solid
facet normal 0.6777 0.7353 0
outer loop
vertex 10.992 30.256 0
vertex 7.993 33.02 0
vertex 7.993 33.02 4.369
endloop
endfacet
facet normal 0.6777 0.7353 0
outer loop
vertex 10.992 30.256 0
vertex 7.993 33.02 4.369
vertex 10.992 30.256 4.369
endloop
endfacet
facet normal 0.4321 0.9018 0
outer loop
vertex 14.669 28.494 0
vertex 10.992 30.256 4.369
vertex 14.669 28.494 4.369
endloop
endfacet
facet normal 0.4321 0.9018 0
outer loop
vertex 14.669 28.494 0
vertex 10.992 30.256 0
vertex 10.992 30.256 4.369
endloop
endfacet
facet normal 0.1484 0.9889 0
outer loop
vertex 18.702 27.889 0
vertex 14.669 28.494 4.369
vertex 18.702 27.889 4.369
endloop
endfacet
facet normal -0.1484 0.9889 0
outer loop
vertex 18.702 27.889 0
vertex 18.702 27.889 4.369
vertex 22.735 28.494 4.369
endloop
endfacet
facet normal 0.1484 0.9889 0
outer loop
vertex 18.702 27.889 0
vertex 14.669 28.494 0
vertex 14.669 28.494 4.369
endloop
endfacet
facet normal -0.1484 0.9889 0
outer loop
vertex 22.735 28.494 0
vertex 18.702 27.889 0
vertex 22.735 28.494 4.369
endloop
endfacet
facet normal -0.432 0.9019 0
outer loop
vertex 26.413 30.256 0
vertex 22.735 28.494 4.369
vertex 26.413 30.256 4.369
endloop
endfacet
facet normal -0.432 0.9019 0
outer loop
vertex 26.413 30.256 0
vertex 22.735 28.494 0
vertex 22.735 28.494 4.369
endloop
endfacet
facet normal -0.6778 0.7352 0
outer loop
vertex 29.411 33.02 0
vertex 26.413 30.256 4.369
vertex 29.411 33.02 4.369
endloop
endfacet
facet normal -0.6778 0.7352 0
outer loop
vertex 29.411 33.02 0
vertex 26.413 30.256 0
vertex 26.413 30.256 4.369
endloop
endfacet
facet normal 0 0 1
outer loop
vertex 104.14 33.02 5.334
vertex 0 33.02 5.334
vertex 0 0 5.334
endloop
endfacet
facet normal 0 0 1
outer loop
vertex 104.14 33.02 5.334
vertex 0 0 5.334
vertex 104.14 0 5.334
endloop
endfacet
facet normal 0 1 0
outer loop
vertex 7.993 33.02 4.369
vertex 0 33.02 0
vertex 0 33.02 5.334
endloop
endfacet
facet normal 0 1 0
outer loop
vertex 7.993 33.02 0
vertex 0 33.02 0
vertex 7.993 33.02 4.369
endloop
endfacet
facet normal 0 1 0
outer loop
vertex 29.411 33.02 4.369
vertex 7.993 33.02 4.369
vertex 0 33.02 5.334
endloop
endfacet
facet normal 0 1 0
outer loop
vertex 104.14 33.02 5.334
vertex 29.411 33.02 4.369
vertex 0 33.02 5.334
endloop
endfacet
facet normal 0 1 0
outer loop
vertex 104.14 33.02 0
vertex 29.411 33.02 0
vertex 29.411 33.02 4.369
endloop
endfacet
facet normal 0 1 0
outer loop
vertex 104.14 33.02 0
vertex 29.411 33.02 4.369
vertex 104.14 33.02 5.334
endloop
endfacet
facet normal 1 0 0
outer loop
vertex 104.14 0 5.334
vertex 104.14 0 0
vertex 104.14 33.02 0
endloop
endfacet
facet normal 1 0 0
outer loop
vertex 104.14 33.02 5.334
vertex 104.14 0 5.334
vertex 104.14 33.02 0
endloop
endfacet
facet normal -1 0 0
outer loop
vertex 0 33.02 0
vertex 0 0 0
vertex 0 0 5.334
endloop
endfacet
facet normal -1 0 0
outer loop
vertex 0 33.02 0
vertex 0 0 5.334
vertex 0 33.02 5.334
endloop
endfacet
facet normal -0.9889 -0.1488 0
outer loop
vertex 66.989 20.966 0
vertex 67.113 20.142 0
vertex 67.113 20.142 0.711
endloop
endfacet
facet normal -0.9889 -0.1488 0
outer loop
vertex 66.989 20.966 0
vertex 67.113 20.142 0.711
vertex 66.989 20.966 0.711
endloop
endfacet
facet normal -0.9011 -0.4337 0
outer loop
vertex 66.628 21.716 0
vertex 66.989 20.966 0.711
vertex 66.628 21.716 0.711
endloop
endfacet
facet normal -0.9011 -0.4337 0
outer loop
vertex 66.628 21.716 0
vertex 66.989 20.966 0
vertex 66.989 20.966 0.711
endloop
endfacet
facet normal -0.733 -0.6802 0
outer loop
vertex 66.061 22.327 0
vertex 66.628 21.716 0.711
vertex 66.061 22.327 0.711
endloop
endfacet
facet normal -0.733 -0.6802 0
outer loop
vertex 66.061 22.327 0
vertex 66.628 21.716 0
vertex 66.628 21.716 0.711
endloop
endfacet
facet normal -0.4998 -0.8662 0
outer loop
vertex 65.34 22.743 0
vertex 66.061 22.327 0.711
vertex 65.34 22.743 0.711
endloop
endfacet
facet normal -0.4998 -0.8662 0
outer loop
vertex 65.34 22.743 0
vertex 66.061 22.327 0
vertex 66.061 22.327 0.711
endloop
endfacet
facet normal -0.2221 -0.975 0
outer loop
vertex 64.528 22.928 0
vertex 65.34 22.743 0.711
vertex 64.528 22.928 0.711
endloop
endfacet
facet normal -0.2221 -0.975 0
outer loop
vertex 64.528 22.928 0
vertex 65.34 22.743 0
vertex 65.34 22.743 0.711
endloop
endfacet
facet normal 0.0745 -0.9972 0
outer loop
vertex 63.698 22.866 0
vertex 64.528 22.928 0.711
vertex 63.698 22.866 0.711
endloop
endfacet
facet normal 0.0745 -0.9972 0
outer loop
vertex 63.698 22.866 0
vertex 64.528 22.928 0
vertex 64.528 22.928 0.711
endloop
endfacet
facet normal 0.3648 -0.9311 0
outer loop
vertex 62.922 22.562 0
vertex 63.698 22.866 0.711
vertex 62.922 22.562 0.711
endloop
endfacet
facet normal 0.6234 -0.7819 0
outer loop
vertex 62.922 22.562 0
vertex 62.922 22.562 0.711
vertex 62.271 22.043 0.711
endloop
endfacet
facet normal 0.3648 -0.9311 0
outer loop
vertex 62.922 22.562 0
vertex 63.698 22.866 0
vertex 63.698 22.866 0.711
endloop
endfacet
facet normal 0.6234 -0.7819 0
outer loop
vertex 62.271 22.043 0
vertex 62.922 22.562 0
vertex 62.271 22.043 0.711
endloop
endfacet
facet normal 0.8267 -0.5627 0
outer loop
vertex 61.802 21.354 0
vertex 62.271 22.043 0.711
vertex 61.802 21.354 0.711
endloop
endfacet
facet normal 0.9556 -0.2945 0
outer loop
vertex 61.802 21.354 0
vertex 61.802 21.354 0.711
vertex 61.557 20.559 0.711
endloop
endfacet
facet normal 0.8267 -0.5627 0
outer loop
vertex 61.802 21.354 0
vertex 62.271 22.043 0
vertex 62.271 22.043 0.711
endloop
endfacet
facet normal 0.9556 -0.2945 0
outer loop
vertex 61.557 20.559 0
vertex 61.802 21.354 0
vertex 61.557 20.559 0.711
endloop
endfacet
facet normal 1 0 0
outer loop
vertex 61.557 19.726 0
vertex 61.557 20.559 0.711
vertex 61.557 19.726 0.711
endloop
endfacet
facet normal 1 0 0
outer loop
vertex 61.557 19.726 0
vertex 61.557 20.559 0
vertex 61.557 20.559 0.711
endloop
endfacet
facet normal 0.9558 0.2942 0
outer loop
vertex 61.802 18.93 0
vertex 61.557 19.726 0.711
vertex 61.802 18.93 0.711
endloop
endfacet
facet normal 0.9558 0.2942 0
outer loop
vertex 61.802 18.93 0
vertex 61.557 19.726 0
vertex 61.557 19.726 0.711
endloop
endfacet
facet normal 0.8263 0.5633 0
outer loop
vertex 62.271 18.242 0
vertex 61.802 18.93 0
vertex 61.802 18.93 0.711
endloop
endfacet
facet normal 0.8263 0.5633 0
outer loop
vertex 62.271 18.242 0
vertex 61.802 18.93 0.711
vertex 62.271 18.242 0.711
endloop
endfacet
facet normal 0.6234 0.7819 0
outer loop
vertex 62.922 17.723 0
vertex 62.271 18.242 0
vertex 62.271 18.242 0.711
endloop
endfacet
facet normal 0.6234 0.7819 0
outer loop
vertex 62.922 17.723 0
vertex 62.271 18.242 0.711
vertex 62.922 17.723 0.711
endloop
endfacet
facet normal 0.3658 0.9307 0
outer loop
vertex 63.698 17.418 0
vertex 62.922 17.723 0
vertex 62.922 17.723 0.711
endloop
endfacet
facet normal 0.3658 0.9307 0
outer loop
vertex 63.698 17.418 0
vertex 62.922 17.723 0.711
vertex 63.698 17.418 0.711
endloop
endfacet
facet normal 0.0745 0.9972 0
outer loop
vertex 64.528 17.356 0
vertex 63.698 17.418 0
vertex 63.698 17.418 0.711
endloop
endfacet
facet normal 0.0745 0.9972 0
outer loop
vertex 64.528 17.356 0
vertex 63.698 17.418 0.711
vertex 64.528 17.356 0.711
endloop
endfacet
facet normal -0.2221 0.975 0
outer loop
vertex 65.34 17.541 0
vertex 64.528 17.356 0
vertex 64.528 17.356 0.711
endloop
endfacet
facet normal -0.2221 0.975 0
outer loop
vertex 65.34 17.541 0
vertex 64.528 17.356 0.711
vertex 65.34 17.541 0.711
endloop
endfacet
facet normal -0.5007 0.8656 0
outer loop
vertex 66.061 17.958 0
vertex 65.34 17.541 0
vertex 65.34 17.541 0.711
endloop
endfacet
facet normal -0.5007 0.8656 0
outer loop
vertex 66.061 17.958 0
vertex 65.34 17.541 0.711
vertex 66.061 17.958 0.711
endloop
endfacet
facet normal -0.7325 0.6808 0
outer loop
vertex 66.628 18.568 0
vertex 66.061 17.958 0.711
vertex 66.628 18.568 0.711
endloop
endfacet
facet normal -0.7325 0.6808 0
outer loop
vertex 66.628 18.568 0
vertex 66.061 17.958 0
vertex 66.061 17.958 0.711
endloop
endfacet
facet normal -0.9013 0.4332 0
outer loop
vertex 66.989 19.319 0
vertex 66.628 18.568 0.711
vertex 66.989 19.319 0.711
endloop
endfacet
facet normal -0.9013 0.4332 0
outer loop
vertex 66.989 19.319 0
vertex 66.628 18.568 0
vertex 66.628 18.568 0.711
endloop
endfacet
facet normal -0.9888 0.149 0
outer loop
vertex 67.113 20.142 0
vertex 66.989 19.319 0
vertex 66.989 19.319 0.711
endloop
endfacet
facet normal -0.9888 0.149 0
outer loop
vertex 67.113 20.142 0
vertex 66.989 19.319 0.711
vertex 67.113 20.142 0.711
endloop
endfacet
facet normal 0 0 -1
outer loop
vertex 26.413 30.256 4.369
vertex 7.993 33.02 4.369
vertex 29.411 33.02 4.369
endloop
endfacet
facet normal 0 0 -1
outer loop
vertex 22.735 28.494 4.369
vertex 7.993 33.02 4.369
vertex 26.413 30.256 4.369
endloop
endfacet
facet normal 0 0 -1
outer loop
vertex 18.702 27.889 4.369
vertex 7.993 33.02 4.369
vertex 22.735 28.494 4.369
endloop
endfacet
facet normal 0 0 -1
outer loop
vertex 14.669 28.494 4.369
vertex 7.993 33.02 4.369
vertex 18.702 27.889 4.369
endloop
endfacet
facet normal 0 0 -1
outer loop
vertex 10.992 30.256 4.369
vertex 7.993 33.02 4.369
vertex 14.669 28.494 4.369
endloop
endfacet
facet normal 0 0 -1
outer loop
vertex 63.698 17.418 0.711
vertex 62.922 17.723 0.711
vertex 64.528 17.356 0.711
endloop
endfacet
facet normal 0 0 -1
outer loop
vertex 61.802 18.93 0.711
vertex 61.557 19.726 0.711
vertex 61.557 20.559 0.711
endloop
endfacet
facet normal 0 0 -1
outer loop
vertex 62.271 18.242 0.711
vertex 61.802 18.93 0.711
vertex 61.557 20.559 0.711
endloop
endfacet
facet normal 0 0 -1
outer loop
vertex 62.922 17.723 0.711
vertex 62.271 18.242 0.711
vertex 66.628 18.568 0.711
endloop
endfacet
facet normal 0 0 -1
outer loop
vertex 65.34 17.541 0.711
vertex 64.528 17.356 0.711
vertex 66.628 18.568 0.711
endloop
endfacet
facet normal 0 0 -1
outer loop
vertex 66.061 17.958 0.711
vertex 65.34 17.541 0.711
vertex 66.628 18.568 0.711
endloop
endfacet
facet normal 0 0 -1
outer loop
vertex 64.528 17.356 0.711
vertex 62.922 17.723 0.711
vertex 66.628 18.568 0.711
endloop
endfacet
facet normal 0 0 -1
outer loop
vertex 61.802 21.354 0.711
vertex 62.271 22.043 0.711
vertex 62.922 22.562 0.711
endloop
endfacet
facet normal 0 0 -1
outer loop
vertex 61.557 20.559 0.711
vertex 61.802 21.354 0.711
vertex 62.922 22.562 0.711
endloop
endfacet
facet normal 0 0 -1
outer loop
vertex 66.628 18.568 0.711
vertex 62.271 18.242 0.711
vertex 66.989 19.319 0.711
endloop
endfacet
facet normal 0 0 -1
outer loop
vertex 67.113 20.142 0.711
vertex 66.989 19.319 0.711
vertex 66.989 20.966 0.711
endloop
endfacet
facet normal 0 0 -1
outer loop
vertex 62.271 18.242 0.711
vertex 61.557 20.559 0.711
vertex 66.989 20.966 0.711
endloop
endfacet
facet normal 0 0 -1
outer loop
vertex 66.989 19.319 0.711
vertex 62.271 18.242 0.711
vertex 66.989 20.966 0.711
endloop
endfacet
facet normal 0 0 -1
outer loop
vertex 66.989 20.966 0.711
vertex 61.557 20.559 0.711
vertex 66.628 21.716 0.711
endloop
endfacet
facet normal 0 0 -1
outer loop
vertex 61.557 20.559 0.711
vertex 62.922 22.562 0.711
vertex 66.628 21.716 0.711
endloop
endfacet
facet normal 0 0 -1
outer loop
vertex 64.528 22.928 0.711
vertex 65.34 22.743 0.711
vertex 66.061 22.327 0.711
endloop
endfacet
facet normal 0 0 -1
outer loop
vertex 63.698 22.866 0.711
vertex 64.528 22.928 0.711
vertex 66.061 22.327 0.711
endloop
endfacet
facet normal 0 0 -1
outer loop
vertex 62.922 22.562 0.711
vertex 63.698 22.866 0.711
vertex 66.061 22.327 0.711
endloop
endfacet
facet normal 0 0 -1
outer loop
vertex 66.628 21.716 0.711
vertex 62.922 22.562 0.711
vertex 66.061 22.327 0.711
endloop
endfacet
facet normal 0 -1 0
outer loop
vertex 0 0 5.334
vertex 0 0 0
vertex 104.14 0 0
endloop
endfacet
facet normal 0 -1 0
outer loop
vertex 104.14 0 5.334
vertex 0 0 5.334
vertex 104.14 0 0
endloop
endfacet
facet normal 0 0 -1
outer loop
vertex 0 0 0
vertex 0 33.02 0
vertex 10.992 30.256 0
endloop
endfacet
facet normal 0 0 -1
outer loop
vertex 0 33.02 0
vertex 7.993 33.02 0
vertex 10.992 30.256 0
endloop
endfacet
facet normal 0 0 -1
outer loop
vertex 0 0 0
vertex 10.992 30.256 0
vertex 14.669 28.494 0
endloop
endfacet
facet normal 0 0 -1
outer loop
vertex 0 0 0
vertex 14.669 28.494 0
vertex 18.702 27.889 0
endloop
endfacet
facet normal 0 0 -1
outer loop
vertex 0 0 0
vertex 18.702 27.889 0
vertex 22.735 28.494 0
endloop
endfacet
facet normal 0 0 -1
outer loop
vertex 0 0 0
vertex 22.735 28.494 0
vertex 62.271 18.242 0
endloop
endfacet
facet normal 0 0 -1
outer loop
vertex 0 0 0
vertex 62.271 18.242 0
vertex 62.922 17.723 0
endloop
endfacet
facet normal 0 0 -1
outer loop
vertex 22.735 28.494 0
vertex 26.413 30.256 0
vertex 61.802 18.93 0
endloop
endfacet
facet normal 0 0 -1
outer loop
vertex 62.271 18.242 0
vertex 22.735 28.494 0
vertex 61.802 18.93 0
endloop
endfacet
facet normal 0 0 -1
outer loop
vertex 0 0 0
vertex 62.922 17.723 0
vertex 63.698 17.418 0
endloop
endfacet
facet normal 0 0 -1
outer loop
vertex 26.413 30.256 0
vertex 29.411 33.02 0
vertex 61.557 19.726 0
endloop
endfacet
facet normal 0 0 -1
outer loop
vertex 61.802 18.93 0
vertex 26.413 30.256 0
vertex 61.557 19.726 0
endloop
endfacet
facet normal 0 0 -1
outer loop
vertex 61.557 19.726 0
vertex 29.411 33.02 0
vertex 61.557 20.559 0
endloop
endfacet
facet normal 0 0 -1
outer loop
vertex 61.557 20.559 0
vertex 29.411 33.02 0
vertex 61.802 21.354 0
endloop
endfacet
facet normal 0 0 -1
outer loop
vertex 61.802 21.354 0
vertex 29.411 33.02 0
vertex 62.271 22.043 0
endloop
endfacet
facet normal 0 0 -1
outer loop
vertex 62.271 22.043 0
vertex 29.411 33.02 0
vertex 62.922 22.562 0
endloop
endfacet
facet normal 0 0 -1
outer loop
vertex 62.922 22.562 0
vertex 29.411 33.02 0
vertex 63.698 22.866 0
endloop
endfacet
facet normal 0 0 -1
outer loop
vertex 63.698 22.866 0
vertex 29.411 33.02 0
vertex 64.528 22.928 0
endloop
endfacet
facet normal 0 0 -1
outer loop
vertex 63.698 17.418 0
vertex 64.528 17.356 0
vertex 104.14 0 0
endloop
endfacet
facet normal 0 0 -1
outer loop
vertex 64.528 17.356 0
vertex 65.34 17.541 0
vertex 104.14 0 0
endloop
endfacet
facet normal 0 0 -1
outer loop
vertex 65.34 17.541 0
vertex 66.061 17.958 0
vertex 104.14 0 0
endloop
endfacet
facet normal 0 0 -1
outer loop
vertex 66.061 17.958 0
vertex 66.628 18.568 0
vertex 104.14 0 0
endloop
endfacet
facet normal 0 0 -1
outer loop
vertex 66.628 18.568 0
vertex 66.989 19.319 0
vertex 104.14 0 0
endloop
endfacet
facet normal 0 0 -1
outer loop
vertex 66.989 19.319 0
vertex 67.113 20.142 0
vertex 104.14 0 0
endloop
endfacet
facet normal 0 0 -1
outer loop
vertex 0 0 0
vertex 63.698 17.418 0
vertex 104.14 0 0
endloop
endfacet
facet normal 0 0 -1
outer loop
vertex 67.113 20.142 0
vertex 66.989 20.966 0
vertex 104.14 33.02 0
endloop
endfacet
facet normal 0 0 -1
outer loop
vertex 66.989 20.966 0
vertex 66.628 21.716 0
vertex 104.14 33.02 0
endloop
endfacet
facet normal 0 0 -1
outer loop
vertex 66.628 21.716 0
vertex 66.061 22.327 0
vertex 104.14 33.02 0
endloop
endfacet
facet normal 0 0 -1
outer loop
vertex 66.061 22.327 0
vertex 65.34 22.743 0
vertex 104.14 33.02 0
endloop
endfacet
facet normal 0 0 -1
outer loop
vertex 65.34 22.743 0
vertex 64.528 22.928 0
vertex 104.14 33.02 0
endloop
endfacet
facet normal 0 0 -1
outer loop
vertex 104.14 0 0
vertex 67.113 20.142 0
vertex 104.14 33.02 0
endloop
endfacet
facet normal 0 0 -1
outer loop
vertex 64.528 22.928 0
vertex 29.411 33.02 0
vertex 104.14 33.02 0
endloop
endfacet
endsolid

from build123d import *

# Parameters (mm, degrees)
SKETCH1_W           = 104.14
SKETCH1_H           = 33.02
BOSS_EXTRUDE1_DEPTH = 5.334
CAVITY1_DEPTH       = 4.3688
CAVITY1_2_OUTLINE_R = 2.794
CAVITY1_2_DEPTH     = 0.7112


# Read off the part's stored shape, not the designer's step: Cavity1
with BuildPart() as part:
    # Sketch1 → Boss-Extrude1 (new body)
    with BuildSketch(Plane.XY):
        with Locations((52.07, 16.51)):
            Rectangle(SKETCH1_W, SKETCH1_H)
    extrude(amount=BOSS_EXTRUDE1_DEPTH)

    # Cavity1 outline → Cavity1 (cut)
    with BuildSketch(Plane.XY):
        with BuildLine():
            ThreePointArc((7.993160963, 33.02), (18.702187299, 27.889223026), (29.411213634, 33.02))
            Line((29.411213634, 33.02), (7.993160963, 33.02))
        make_face()
    extrude(amount=CAVITY1_DEPTH, mode=Mode.SUBTRACT)

    # Cavity1 2 outline → Cavity1 2 (cut)
    with BuildSketch(Plane.XY):
        with Locations((64.319453414, 20.142181246)):
            Circle(CAVITY1_2_OUTLINE_R)
    extrude(amount=CAVITY1_2_DEPTH, mode=Mode.SUBTRACT)


solid = part.part
